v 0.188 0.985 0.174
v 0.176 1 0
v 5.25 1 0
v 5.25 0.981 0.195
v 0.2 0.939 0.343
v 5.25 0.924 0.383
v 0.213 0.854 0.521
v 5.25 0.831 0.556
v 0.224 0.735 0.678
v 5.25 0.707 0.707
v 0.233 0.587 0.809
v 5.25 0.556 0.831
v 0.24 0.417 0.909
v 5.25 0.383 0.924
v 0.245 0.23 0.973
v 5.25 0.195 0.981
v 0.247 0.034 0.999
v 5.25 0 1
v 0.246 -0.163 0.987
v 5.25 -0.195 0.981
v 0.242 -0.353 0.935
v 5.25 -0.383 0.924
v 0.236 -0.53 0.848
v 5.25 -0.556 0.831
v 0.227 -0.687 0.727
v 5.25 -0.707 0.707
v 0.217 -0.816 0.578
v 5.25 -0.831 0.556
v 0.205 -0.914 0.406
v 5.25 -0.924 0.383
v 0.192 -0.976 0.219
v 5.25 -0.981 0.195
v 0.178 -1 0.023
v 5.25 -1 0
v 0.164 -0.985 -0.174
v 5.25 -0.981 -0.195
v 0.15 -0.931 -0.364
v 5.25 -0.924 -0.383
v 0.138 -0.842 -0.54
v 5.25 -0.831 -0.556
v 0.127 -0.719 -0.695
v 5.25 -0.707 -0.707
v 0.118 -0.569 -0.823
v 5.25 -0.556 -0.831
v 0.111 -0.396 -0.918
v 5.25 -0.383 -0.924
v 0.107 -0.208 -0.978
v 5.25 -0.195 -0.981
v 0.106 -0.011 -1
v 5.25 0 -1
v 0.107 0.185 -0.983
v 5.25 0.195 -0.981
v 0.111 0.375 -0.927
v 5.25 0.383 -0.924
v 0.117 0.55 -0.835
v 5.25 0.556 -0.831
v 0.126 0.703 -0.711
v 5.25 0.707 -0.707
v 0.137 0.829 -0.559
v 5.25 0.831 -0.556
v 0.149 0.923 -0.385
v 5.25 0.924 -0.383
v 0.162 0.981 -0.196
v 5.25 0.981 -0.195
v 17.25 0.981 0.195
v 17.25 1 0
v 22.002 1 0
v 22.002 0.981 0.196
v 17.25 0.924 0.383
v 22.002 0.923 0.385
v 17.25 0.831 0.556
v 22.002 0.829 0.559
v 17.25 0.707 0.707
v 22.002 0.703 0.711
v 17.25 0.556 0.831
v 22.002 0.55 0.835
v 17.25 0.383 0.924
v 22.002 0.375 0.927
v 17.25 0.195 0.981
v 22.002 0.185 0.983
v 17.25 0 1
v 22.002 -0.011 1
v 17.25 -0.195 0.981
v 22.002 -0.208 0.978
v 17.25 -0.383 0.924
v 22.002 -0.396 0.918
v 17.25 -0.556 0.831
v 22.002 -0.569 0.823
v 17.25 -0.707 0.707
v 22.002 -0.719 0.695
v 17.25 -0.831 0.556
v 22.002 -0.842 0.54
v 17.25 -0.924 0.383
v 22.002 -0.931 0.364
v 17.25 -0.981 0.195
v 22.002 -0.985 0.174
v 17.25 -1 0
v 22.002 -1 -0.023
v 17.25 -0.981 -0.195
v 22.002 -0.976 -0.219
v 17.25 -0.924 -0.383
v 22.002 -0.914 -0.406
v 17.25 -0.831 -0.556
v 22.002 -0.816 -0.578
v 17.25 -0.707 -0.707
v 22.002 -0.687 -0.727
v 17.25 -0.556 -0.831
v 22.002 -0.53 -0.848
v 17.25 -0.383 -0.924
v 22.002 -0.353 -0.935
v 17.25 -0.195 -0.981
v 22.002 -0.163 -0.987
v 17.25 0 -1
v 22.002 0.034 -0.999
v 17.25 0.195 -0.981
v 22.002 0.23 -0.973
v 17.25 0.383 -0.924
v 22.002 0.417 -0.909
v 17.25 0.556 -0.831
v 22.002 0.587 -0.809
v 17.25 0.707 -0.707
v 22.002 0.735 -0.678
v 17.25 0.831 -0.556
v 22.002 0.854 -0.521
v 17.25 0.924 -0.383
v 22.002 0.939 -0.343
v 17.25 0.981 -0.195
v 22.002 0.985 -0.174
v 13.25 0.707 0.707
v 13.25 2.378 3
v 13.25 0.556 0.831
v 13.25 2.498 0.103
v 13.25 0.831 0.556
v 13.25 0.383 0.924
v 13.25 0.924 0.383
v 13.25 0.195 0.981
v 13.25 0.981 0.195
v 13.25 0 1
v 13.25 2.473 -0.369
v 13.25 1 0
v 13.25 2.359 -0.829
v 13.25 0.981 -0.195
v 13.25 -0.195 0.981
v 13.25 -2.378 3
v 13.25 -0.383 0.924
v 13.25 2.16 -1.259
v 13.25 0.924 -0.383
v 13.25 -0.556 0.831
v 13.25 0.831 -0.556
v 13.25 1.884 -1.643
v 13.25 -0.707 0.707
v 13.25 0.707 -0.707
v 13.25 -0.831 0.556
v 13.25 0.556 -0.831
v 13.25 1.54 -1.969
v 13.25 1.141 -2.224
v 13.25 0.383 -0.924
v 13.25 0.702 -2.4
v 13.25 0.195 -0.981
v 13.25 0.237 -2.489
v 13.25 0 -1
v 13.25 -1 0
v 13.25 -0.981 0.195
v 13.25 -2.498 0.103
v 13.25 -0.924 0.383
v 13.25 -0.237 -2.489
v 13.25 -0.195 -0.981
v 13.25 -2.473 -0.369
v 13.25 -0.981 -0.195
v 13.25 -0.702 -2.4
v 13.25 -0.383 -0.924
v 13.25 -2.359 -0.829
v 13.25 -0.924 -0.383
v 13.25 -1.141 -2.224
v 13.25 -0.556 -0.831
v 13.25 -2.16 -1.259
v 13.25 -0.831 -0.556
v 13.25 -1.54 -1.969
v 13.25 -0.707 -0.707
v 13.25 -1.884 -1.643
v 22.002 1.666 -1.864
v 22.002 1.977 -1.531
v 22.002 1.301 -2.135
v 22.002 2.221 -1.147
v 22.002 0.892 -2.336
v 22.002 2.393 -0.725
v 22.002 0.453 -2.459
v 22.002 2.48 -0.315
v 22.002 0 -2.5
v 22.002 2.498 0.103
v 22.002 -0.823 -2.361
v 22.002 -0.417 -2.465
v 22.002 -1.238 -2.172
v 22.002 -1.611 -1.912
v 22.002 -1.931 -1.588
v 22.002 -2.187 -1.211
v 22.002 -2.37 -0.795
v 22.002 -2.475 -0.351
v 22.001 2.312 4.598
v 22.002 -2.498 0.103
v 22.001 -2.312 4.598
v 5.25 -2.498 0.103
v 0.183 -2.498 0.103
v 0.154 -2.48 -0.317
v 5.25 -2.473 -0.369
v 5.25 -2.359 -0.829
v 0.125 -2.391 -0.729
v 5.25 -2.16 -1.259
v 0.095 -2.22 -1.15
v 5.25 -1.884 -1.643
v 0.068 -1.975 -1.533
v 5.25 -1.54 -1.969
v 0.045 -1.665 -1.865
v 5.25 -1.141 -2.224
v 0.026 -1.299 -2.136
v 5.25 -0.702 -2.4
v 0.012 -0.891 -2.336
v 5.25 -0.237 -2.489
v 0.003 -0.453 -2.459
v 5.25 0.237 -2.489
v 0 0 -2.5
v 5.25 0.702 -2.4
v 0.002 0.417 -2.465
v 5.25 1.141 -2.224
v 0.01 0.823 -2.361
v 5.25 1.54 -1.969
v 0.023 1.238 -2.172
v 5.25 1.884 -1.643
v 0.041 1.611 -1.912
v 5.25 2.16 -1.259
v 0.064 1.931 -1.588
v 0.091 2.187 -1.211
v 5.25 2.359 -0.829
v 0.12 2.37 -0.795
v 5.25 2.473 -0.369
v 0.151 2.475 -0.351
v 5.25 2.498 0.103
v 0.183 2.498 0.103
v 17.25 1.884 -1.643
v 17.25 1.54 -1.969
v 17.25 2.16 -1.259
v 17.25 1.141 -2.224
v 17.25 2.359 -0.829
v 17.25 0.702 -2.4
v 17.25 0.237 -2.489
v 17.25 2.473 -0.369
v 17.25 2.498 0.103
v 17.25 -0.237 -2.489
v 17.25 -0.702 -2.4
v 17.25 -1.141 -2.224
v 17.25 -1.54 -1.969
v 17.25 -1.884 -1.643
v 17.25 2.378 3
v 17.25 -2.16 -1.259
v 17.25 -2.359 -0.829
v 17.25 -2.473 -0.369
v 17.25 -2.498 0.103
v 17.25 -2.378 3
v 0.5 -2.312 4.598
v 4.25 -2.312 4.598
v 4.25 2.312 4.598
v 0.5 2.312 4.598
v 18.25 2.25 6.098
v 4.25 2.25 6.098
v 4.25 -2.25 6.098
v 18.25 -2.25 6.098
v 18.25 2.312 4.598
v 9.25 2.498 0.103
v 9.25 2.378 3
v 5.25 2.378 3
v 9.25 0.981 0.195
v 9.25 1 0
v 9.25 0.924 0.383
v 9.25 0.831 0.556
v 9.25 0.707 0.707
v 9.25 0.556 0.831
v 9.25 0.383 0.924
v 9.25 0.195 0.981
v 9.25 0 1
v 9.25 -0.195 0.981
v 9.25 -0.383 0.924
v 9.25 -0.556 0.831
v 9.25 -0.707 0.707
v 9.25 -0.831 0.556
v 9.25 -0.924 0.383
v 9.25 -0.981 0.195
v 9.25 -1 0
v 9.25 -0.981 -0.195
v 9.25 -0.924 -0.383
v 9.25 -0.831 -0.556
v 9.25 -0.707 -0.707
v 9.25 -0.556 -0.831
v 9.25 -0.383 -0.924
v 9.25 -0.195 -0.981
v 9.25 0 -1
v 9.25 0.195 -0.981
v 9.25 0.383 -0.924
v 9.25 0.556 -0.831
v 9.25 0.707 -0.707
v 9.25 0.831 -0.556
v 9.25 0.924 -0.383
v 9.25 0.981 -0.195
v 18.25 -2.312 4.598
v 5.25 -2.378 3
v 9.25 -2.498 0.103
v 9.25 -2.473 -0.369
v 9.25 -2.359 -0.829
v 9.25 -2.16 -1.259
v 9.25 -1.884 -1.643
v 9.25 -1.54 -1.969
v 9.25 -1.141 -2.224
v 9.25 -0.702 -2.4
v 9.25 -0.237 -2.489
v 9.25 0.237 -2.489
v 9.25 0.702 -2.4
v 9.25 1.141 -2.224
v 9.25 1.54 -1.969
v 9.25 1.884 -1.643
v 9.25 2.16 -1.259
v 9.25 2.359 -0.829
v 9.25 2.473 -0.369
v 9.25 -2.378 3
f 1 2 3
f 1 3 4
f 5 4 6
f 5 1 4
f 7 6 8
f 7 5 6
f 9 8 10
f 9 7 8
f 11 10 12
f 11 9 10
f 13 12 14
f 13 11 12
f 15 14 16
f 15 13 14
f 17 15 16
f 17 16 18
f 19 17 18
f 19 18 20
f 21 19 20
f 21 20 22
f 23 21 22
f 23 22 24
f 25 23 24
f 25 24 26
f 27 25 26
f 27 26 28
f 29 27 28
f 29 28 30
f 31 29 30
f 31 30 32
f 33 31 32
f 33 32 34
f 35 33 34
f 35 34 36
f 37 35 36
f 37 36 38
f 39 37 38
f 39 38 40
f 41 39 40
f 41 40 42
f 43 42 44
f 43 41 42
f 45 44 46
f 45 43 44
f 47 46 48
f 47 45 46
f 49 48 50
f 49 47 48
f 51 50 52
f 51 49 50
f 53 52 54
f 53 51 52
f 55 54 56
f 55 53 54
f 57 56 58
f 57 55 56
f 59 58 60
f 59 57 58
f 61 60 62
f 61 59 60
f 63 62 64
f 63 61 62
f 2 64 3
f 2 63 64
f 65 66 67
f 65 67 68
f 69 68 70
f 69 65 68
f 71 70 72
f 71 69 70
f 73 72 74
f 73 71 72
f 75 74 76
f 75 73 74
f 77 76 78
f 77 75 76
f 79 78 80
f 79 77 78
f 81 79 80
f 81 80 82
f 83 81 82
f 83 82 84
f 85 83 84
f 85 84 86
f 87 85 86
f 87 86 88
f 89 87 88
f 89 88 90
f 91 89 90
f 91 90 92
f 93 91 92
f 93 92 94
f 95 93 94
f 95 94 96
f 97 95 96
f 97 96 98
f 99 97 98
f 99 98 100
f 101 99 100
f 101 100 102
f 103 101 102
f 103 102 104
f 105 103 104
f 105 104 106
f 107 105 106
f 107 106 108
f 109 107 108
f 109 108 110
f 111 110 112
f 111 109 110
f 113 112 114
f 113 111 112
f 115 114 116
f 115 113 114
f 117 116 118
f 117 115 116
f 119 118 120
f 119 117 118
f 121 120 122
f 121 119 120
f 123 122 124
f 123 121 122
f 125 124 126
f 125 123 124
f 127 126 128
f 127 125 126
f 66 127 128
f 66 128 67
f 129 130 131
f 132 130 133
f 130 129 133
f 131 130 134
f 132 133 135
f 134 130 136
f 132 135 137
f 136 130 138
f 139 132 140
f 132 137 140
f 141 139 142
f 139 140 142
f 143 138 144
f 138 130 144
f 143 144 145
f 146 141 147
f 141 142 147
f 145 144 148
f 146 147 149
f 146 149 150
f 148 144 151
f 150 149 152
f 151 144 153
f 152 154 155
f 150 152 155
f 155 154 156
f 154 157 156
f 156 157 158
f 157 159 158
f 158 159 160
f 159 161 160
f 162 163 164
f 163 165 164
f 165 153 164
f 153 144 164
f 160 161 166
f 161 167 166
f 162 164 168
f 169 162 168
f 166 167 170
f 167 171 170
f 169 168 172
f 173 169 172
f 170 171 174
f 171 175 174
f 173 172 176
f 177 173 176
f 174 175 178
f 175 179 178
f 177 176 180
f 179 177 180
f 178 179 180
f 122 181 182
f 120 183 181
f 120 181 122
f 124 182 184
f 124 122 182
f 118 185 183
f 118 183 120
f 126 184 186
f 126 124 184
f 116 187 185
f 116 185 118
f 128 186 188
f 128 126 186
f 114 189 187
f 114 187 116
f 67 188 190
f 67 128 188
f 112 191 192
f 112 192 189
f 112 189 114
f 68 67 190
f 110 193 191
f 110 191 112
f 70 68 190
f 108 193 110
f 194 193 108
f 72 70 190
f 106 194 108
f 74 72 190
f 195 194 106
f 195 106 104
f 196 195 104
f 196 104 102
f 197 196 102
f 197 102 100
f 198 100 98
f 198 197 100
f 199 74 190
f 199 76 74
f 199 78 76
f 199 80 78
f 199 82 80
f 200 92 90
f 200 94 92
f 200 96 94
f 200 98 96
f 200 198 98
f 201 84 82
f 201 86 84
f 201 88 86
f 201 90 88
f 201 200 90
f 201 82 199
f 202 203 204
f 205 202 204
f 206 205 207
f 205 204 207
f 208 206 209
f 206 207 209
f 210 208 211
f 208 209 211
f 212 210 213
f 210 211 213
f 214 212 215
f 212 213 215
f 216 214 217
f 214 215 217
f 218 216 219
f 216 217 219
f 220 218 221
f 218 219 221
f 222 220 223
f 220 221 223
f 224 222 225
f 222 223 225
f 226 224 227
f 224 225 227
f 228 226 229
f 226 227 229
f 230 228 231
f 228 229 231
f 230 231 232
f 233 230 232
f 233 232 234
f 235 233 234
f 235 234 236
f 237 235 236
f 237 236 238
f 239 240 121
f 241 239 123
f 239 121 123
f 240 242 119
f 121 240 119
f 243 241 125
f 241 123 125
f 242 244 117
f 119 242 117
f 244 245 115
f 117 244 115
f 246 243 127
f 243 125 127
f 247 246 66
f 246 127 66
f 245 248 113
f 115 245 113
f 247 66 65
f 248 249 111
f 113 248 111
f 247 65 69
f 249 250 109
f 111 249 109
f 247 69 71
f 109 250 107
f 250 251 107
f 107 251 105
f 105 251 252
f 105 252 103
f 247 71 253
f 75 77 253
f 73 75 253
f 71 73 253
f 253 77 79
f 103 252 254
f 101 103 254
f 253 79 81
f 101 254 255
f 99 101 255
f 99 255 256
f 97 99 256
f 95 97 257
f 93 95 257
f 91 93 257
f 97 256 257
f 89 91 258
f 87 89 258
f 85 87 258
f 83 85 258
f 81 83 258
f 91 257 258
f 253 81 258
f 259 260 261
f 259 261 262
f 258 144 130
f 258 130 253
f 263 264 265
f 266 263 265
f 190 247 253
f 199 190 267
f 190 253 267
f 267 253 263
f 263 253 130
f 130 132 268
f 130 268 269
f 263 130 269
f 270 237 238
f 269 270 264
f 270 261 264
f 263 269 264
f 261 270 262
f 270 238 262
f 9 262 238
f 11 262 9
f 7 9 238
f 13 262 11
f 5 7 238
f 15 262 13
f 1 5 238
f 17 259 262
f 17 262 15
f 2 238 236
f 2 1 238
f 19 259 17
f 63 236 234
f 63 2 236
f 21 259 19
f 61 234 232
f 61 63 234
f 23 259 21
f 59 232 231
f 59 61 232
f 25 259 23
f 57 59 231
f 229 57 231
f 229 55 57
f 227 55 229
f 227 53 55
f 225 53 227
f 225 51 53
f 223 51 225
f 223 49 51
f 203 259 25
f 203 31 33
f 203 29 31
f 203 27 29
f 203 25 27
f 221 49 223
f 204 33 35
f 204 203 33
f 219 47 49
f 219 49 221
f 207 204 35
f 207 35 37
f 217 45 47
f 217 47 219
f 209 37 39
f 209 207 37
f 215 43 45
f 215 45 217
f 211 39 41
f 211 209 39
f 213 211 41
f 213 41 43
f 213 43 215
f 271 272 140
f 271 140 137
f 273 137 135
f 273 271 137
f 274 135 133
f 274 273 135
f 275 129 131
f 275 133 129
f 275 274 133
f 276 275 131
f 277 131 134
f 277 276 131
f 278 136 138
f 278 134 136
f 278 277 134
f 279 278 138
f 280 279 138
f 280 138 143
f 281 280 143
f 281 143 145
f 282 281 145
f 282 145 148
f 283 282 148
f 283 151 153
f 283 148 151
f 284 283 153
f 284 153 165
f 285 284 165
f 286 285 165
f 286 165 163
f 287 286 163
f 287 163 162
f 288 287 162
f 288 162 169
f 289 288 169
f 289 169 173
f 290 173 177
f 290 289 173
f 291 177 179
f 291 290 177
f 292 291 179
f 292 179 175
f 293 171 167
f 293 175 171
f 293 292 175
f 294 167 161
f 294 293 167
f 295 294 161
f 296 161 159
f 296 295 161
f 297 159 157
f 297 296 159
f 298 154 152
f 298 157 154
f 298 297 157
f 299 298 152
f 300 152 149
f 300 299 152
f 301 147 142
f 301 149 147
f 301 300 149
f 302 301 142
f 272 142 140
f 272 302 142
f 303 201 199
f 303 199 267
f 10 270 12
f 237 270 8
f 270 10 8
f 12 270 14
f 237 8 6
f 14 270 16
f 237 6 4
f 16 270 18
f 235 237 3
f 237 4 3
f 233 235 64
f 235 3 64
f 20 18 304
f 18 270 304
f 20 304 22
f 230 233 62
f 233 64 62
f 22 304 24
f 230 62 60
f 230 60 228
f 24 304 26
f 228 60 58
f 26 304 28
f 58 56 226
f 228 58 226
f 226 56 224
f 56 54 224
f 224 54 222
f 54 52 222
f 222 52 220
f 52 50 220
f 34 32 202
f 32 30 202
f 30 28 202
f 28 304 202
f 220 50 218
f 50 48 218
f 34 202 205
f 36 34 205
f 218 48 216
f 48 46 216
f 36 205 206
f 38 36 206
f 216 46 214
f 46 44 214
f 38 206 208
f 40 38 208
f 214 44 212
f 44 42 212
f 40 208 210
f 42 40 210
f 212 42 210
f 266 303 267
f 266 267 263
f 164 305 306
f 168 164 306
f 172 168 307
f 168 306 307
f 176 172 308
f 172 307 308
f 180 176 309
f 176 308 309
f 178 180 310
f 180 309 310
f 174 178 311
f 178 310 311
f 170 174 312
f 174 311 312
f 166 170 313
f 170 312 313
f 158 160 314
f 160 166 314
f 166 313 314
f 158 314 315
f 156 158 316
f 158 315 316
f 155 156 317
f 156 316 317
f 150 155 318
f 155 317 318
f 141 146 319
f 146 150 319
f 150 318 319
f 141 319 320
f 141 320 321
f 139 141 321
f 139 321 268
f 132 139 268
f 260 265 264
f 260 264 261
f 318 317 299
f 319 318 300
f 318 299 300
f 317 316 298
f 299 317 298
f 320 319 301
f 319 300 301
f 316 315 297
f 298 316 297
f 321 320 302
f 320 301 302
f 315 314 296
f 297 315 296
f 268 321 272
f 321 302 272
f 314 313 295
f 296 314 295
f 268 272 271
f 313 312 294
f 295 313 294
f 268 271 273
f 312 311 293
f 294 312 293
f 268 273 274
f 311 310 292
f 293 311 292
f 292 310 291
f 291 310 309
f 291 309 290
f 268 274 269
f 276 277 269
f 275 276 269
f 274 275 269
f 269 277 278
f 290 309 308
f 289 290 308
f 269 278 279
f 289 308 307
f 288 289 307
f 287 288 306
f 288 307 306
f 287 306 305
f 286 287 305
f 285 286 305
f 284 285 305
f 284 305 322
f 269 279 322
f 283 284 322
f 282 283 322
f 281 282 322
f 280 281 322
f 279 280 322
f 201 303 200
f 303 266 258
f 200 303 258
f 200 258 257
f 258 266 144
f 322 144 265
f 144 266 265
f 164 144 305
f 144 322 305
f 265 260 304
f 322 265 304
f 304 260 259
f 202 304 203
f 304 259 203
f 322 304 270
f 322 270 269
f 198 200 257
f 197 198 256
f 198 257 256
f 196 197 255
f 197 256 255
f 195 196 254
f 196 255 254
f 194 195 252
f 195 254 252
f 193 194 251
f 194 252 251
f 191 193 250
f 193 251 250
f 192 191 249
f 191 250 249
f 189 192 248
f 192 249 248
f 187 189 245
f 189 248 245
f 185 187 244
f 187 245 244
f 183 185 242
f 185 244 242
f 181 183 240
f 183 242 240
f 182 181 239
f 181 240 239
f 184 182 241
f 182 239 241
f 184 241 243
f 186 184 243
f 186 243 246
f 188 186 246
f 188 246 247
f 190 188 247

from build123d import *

# Parameters (mm, degrees)
F0_R     = 1
F1_DEPTH = 22.5
F2_W     = 4
F2_H     = 5.5
F3_DEPTH = 12.5
F4_W     = 4
F4_H     = 2.8967225653
F4_H_2   = 2.6032774347
F5_DEPTH = 12.5


with BuildPart() as f1:
    # F0 (on Right) → F1 (new body)
    with BuildSketch(Plane.YZ):
        with BuildLine():
            Line((-2.25, 6.0981554588), (-2.4978658434, 0.1032774347))
            ThreePointArc((-2.4978658434, 0.1032774347), (0, -2.5), (2.4978658434, 0.1032774347))
            Line((2.4978658434, 0.1032774347), (2.25, 6.0981554588))
            Line((2.25, 6.0981554588), (-2.25, 6.0981554588))
        make_face()
        Circle(F0_R, mode=Mode.SUBTRACT)
    extrude(amount=F1_DEPTH)

    # F2 (on Front) → F3 (intersect, symmetric)
    with BuildSketch(Plane.XZ):
        Polygon((18.25, 6.0981554588), (4.25, 6.0981554588), (4.25, 4.5981554588), (0.5, 4.5981554588), (0, -2.5), (5.25, -2.5), (5.25, 3), (9.25, 3), (9.25, -2.5), (13.25, -2.5), (13.25, 3), (17.25, 3), (17.25, -2.5), (22.0024140141, -2.5), (22.0008491054, 4.5981554588), (18.25, 4.5981554588), align=None)
        Polygon((5.25, -2.5), (0, -2.5), (5.25, -3.4987433143), align=None)
        Polygon((21.3468169383, -4.6197534539), (22.0024140141, -2.5), (17.25, -2.5), (17.25, -4.6197534539), align=None)
        with Locations((7.25, 0.25)):
            Rectangle(F2_W, F2_H)
        with Locations((15.25, 0.25)):
            Rectangle(F2_W, F2_H)
        Polygon((13.25, -2.5), (9.25, -2.5), (9.25, -3.4987433143), (13.25, -4.6197534539), align=None)
    extrude(amount=F3_DEPTH, both=True, mode=Mode.INTERSECT)

    # F4 (on Front) → F5 (cut, symmetric)
    with BuildSketch(Plane.XZ):
        with Locations((7.25, 1.5516387174)):
            Rectangle(F4_W, F4_H)
        Polygon((9.25, -2.5), (5.25, -2.5), (5.25, -7), (17.25, -7), (17.25, -2.5), (13.25, -2.5), (13.25, -5), (9.25, -5), align=None)
        with Locations((7.25, -1.1983612826)):
            Rectangle(F4_W, F4_H_2)
        with Locations((15.25, 1.5516387174)):
            Rectangle(F4_W, F4_H)
        with Locations((15.25, -1.1983612826)):
            Rectangle(F4_W, F4_H_2)
    extrude(amount=F5_DEPTH, both=True, mode=Mode.SUBTRACT)


solid = f1.part
